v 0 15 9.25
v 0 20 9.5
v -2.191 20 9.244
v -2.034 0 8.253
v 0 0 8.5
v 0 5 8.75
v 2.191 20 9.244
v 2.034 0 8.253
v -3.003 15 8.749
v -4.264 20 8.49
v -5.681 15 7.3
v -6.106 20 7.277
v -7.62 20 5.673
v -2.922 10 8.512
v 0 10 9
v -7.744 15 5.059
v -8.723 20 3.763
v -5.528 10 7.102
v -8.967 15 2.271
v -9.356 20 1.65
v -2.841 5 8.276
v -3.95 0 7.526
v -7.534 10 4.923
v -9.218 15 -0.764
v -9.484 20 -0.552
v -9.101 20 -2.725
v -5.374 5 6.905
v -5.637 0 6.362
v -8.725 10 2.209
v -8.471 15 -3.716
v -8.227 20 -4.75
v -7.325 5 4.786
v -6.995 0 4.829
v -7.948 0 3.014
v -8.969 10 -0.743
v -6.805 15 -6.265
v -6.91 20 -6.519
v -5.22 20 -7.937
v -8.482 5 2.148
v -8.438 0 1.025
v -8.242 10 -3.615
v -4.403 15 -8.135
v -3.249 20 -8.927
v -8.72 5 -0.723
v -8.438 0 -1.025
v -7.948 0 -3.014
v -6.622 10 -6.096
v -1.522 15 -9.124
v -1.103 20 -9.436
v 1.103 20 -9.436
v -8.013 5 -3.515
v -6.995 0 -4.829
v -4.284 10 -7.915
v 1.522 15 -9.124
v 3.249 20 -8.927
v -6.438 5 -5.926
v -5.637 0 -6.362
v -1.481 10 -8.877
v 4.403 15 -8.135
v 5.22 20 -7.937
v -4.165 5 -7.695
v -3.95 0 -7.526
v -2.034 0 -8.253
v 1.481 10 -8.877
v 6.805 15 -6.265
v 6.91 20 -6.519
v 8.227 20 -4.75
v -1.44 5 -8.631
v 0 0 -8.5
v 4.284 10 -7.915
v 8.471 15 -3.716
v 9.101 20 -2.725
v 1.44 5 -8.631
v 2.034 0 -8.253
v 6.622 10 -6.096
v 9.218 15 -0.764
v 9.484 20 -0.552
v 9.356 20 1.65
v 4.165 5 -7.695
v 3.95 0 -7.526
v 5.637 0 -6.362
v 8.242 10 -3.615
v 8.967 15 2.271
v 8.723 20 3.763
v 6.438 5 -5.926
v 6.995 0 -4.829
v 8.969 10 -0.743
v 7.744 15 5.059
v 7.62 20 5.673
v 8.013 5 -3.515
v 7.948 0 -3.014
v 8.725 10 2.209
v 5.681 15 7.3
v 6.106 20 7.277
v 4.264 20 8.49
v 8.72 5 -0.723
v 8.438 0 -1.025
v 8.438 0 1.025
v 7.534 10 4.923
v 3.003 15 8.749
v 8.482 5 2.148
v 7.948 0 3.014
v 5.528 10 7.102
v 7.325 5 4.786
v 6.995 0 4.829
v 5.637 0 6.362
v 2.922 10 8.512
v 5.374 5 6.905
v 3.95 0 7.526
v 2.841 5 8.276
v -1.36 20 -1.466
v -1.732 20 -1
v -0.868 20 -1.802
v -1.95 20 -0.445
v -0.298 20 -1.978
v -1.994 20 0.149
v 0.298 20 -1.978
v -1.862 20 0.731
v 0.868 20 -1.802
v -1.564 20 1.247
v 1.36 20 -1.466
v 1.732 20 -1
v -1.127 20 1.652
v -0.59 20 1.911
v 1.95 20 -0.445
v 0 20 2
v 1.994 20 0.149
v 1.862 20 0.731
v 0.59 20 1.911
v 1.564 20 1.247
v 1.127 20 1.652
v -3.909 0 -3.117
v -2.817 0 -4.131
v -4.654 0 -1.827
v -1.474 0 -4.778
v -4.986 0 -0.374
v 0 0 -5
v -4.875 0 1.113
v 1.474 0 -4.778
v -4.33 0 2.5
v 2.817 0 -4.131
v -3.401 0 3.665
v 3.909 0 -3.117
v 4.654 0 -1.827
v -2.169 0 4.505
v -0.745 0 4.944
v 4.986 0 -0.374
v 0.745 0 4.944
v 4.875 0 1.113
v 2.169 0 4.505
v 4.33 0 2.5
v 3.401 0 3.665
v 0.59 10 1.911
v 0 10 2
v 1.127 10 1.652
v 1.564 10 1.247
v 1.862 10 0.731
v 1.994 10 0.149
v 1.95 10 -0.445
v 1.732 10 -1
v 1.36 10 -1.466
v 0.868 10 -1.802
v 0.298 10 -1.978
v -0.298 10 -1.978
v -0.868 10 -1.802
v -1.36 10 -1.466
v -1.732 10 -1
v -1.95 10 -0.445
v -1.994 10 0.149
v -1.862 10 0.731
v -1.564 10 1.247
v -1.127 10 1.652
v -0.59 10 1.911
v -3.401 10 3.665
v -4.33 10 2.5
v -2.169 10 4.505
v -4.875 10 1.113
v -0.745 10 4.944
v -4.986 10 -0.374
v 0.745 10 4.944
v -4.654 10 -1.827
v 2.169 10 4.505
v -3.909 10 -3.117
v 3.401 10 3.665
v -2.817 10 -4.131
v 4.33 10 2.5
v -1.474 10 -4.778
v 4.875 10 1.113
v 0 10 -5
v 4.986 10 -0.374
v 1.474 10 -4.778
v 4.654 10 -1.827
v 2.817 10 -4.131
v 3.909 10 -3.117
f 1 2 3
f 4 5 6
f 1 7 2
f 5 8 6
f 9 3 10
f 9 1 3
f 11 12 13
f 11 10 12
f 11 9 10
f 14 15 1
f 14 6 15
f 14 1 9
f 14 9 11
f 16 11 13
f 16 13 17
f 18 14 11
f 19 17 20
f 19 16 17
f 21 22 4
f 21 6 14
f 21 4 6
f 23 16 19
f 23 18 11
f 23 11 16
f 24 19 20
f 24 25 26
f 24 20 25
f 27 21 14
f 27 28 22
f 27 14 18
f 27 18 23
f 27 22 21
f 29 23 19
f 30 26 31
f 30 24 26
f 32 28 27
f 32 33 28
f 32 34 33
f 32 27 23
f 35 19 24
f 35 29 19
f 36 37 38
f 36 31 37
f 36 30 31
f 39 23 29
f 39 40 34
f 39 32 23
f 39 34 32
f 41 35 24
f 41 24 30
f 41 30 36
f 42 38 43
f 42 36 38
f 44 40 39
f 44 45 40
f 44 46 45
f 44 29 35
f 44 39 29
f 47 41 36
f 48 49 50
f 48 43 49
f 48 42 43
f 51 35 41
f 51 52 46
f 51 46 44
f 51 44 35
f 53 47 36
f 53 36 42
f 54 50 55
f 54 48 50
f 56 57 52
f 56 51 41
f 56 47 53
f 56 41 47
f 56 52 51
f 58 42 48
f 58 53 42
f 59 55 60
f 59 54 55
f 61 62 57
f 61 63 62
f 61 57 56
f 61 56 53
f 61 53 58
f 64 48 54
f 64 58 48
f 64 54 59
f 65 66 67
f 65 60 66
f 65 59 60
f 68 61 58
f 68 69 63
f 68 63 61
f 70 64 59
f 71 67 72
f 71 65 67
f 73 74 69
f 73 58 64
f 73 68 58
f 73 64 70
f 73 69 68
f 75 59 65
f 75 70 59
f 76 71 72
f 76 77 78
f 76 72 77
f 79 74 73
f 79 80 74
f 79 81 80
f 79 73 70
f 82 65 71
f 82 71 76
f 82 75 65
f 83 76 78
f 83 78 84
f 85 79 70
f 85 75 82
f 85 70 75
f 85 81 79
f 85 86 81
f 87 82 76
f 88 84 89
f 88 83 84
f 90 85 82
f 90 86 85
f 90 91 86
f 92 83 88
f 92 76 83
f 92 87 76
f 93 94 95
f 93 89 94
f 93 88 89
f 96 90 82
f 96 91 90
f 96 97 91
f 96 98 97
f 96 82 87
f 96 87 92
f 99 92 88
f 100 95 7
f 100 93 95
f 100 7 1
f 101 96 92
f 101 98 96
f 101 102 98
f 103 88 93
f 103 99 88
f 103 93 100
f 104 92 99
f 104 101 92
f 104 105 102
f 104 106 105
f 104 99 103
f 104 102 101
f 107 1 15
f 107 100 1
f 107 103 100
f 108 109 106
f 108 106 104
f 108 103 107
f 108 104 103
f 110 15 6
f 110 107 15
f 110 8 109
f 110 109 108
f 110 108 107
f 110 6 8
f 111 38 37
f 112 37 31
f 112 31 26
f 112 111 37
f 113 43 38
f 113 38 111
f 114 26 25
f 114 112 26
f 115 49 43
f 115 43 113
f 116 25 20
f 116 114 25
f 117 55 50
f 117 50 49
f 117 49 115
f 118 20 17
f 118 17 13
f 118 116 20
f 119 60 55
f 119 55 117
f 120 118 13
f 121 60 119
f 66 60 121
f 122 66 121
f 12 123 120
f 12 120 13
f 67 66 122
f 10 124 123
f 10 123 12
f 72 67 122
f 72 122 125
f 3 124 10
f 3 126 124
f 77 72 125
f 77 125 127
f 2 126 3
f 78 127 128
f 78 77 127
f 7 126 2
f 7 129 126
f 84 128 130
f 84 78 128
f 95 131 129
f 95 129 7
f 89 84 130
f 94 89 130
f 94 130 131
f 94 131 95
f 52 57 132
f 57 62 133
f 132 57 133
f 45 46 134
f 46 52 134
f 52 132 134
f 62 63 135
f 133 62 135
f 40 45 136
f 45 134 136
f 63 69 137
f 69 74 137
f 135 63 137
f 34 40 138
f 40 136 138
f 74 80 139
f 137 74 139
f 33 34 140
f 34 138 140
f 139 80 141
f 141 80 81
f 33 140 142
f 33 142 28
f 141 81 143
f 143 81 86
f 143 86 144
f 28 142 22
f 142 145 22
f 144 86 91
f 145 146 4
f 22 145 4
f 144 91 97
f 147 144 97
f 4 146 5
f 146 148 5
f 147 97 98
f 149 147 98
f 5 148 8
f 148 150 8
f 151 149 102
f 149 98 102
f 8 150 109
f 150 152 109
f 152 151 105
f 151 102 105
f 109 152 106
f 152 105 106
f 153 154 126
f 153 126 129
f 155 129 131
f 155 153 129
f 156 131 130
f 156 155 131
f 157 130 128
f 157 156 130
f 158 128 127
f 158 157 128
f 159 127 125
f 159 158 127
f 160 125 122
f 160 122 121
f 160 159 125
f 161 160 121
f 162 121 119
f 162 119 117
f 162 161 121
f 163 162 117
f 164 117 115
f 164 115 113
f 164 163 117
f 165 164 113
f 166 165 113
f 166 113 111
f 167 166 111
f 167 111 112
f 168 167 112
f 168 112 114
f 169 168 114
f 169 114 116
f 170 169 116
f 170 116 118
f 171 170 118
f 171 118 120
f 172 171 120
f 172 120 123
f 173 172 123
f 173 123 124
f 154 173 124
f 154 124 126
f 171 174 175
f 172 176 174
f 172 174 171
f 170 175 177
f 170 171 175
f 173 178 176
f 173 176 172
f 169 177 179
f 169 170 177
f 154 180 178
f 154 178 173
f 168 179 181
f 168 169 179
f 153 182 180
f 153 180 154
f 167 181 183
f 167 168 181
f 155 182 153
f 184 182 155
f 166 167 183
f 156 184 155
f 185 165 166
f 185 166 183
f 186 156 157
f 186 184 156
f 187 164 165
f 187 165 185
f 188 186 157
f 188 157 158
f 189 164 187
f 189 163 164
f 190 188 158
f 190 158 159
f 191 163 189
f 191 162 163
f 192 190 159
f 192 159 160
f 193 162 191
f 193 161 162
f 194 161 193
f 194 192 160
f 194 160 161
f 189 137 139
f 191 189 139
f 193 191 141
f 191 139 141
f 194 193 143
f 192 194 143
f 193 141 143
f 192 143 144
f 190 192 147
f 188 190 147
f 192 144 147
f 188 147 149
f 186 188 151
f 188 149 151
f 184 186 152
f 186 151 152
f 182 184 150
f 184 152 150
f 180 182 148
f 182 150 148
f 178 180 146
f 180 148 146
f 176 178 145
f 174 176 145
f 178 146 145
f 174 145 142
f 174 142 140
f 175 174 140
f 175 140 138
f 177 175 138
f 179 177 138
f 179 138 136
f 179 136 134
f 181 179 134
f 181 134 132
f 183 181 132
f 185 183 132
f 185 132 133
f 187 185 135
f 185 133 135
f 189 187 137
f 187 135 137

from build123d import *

# Parameters (mm, degrees)
SKETCH1_R           = 9.5
SKETCH1_R_2         = 2
BOSS_EXTRUDE1_DEPTH = 20
SKETCH3_R           = 5
CUT_EXTRUDE1_DEPTH  = 10


with BuildPart() as part:
    # Sketch1 → Boss-Extrude1 (new body)
    with BuildSketch(Plane(origin=(0, 0, 0), x_dir=(1, 0, 0), z_dir=(0, 1, 0))):
        with Locations(Location((0, 0, 0), (0, 0, 270))):
            Circle(SKETCH1_R)
        with Locations(Location((0, 0, 0), (0, 0, 270))):
            Circle(SKETCH1_R_2, mode=Mode.SUBTRACT)
    extrude(amount=BOSS_EXTRUDE1_DEPTH)

    # Sketch2 → Cut-Revolve1 (revolve, cut)
    with BuildSketch(Plane.XY, mode=Mode.PRIVATE) as cut_revolve1_sk:
        Polygon((-9.5, 20), (-8.5, 0), (-9.5, 0), align=None)
    revolve(cut_revolve1_sk.sketch.rotate(Axis((0, 20, 0), (0, -1, 0)), 270), axis=Axis((0, 20, 0), (0, -1, 0)), mode=Mode.SUBTRACT)

    # Sketch3 → Cut-Extrude1 (cut)
    with BuildSketch(Plane.XZ):
        with Locations(Location((0, 0, 0), (0, 0, 270))):
            Circle(SKETCH3_R)
    extrude(amount=-CUT_EXTRUDE1_DEPTH, mode=Mode.SUBTRACT)


solid = part.part
